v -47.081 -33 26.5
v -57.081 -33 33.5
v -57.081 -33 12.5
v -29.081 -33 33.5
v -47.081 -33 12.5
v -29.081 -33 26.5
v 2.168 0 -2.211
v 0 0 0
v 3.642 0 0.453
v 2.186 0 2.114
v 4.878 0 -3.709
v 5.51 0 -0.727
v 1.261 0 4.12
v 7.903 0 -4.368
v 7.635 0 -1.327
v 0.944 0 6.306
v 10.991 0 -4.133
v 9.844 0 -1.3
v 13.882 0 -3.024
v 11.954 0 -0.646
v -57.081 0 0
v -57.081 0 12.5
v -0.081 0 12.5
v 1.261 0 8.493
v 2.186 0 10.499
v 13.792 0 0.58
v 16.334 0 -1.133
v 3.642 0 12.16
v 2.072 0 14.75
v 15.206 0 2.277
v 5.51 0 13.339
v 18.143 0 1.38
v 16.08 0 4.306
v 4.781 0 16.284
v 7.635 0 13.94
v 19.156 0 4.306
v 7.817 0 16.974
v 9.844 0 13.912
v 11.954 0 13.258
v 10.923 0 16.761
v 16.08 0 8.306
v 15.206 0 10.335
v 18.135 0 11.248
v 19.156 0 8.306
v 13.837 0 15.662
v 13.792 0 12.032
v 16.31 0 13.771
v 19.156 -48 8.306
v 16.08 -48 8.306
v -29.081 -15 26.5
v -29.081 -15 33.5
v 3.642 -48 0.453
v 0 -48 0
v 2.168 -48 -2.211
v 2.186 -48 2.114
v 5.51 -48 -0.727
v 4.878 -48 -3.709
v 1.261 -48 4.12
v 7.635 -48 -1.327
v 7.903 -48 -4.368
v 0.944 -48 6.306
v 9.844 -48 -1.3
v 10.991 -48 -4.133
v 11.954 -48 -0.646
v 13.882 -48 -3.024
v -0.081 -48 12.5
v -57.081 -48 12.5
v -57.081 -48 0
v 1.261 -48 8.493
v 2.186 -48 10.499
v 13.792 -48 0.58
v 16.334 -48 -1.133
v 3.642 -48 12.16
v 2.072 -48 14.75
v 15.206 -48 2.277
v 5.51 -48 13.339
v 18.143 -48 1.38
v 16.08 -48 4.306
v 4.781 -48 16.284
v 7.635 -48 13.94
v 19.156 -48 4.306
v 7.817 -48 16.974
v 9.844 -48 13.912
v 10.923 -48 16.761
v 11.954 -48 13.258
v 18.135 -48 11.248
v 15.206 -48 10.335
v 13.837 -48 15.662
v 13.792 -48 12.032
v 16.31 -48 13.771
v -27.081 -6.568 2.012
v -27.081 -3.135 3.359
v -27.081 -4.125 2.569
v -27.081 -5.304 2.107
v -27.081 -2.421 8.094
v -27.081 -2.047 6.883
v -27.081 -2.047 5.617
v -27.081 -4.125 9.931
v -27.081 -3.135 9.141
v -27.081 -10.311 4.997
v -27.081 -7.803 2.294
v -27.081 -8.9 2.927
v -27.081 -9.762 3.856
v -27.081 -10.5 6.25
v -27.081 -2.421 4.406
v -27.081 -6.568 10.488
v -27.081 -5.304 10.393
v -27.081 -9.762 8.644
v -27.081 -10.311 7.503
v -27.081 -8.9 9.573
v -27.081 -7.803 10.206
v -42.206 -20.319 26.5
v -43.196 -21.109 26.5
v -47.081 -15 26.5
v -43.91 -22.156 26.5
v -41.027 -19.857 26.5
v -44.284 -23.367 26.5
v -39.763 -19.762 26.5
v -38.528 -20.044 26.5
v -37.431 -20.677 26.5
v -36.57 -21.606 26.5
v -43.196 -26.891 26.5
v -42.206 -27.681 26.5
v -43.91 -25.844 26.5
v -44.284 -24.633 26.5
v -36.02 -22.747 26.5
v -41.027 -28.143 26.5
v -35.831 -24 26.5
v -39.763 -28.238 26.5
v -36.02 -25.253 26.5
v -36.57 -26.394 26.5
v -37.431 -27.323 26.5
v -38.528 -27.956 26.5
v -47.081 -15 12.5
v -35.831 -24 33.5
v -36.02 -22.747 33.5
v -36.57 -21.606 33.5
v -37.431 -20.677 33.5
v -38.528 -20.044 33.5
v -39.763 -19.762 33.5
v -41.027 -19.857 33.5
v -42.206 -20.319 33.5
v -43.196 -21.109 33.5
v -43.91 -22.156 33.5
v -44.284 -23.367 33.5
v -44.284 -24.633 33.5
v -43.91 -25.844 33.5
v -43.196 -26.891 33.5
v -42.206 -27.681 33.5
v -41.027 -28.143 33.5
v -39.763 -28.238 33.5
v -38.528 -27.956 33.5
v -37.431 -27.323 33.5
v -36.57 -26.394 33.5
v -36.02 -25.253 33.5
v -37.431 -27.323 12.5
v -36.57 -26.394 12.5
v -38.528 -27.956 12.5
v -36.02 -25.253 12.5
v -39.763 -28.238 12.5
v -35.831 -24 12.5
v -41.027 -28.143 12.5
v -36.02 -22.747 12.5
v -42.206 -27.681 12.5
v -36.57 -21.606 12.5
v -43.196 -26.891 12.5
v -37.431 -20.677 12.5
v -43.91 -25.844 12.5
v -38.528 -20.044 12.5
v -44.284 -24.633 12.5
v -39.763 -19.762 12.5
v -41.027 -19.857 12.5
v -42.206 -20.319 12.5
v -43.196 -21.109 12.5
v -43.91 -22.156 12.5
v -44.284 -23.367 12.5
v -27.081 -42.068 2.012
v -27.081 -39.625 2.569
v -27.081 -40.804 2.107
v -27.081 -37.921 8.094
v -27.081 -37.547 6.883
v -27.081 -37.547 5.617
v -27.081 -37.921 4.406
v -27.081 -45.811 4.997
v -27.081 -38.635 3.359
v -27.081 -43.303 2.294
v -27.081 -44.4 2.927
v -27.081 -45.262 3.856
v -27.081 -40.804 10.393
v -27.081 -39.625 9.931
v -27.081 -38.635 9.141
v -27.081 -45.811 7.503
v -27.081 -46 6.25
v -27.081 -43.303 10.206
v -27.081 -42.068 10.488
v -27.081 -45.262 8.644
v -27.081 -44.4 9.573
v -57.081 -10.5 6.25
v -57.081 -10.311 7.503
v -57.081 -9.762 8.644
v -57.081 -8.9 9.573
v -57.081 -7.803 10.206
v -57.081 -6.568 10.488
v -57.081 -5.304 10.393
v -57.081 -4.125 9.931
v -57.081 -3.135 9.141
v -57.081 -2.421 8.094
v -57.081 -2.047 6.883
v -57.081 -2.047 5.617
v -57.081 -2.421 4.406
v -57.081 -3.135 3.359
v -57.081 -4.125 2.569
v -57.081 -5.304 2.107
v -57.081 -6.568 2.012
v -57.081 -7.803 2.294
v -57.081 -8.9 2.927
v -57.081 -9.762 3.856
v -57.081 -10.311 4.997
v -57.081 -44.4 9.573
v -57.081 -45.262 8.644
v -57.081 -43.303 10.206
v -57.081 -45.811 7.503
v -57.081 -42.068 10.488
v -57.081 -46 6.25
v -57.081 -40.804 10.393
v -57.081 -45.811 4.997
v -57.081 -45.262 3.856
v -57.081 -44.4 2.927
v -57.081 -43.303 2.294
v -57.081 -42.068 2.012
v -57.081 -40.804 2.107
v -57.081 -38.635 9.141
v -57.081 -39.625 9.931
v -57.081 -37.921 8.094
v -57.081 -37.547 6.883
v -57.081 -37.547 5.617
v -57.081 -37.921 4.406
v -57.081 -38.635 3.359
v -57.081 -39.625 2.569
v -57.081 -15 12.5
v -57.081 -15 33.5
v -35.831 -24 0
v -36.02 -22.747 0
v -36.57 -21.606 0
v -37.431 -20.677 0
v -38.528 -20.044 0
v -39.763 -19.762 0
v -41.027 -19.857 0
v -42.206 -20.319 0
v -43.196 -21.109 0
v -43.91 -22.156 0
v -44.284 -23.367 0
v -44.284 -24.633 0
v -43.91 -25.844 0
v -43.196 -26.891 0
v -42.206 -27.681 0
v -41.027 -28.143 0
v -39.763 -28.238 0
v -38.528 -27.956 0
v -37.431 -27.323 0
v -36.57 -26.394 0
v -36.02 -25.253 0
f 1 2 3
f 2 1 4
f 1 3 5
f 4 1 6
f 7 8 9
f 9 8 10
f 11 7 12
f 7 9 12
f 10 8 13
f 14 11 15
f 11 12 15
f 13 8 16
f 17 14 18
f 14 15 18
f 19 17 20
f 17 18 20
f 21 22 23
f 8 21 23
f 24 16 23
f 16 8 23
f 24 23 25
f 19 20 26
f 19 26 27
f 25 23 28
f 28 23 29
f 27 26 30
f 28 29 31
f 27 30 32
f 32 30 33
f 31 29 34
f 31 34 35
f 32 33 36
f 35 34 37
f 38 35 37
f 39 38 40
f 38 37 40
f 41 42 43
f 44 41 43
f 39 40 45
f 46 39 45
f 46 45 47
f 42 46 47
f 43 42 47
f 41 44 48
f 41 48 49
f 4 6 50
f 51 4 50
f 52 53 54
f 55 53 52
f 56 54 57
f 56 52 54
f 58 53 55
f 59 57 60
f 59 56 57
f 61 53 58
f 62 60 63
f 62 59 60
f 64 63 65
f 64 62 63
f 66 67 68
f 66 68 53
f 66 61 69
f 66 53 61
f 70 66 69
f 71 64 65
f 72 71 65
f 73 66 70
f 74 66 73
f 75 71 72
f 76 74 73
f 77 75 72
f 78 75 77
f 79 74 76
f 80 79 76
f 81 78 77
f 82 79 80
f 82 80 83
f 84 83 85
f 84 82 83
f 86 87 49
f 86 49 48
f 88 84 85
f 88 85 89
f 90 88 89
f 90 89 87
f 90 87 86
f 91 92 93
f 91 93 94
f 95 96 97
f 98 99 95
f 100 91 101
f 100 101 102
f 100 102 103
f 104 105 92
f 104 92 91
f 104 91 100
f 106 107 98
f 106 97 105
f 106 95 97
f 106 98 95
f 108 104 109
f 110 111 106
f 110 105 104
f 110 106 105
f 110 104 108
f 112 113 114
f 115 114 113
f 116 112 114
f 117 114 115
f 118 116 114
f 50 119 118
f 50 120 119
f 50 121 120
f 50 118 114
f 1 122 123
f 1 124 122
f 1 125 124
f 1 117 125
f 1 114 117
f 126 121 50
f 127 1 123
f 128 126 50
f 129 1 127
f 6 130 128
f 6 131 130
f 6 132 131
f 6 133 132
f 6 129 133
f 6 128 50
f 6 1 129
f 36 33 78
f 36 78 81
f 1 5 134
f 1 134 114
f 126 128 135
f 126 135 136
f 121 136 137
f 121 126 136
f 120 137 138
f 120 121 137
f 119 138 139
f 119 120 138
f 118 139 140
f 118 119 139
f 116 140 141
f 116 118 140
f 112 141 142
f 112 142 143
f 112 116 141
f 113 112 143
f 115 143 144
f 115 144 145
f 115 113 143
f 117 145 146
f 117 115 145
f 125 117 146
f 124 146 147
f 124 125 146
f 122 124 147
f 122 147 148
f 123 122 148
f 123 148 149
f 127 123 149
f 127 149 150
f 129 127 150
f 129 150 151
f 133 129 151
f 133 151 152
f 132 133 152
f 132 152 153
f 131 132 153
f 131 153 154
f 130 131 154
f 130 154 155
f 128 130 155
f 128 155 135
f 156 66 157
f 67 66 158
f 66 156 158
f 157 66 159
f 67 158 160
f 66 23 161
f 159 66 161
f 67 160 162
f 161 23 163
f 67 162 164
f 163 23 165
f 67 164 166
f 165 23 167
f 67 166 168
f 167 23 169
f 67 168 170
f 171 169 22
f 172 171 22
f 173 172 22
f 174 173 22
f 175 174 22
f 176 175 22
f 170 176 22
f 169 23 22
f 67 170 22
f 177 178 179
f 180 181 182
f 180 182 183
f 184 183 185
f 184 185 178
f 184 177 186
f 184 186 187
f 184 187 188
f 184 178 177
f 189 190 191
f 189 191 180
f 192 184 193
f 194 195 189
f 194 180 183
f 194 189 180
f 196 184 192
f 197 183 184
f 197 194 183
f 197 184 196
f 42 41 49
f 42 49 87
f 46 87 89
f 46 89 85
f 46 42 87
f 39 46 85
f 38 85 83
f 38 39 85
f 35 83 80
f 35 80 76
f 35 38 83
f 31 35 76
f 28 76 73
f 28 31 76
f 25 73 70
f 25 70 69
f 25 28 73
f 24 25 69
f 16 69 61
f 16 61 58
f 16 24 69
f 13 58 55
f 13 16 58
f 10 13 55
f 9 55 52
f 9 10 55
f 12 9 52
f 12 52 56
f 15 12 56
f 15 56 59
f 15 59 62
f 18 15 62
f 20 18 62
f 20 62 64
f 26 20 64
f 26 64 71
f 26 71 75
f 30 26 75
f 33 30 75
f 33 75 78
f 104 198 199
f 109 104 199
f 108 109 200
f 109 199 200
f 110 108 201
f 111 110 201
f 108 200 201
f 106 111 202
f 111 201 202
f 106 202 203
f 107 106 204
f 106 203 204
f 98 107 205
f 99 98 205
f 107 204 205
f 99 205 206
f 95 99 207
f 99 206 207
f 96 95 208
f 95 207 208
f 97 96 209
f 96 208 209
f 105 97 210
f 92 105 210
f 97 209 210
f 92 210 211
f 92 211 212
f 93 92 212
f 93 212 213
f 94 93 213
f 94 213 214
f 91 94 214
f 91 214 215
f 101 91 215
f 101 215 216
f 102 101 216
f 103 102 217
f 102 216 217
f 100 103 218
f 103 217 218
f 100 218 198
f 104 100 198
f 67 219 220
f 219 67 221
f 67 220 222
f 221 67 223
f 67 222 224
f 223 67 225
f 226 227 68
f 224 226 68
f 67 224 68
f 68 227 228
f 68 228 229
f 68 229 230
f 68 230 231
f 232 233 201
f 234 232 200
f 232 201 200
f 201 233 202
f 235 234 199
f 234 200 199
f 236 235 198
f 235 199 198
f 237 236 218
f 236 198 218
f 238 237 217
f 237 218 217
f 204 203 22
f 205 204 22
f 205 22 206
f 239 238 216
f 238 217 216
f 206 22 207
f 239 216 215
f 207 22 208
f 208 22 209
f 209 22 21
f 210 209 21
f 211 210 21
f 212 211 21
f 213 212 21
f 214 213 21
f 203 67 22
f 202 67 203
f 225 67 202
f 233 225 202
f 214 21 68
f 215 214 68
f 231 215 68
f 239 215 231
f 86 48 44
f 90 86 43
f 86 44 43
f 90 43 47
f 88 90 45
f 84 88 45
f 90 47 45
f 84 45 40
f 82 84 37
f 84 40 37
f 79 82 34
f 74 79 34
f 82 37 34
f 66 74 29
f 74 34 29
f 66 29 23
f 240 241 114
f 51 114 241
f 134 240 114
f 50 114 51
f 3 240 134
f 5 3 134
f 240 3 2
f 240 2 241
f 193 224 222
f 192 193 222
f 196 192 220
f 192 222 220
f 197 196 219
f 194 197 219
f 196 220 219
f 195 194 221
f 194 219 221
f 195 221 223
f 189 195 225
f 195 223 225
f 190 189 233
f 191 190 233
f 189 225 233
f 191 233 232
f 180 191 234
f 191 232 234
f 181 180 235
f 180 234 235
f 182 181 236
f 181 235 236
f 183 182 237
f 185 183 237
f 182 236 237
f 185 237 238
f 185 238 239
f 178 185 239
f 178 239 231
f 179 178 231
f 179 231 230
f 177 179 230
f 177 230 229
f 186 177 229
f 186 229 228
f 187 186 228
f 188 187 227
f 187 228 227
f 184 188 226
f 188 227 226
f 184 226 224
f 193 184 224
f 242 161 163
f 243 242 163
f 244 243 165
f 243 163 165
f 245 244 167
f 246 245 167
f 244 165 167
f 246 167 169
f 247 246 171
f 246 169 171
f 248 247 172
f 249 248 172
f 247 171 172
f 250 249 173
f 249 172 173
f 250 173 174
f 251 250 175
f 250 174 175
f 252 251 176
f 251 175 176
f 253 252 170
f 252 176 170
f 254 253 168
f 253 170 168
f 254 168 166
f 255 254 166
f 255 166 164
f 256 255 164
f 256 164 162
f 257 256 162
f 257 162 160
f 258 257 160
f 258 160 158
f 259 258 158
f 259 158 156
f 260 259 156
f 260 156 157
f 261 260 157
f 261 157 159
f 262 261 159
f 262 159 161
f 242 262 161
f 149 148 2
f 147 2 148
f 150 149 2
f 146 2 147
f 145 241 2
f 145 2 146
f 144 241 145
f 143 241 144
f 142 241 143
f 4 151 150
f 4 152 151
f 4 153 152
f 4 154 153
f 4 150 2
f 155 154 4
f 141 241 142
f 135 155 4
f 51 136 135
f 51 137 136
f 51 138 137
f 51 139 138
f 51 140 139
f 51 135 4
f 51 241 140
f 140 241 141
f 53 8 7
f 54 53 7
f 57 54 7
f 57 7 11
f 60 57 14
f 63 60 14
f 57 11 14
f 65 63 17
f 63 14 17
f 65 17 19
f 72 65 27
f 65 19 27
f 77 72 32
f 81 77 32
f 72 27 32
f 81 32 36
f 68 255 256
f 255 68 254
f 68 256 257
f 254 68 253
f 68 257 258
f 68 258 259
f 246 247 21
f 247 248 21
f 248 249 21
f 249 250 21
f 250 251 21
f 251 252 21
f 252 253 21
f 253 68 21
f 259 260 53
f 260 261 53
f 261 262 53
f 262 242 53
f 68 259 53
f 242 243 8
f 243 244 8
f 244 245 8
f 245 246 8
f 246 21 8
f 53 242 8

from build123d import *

# Parameters (mm, degrees)
F2_R      = 7.7
F3_DEPTH  = 48
F4_R      = 4.25
F5_DEPTH  = 30
F6_W      = 28
F6_H      = 18
F6_R      = 4.25
F7_DEPTH  = 21
F8_W      = 18
F8_H      = 14
F9_DEPTH  = 25
F10_R     = 4.25
F11_DEPTH = 25
F12_DEPTH = 60
F14_DEPTH = 48


with BuildPart() as f3:
    # F2 (on Front) → F3 (new body)
    with BuildSketch(Plane.XZ):
        with BuildLine():
            Line((-57.0810220509, 0), (0, 0))
            ThreePointArc((0, 0), (-2.0556624872, 6.2369382637), (-0.0810220509, 12.5))
            Line((-0.0810220509, 12.5), (-57.0810220509, 12.5))
            Line((-57.0810220509, 12.5), (-57.0810220509, 0))
        make_face()
        with BuildLine():
            Line((-0.0810220509, 12.5), (0, 0))
            ThreePointArc((0, 0), (11.9605862967, -3.8667611144), (19.344112749, 6.3062916824))
            ThreePointArc((19.344112749, 6.3062916824), (11.894578688, 16.5006269319), (-0.0810220509, 12.5))
        make_face()
        with Locations((8.644112749, 6.3062916824)):
            Circle(F2_R, mode=Mode.SUBTRACT)
        with BuildLine():
            ThreePointArc((-0.0810220509, 12.5), (-2.0556624872, 6.2369382637), (0, 0))
            Line((0, 0), (-0.0810220509, 12.5))
        make_face()
    extrude(amount=F3_DEPTH)

    # F4 (on face) → F5 (cut)
    with BuildSketch(Plane(origin=(-57.0810220509, 0, 0), x_dir=(0, -1, 0), z_dir=(-1, 0, 0))):
        with Locations((6.25, 6.25)):
            Circle(F4_R)
        with Locations((41.75, 6.25)):
            Circle(F4_R)
    extrude(amount=-F5_DEPTH, mode=Mode.SUBTRACT)


with BuildPart() as f7:
    # F6 (on face) → F7 (new body)
    with BuildSketch(Plane.XY.offset(12.5)):
        with Locations((-43.0810220509, -24)):
            Rectangle(F6_W, F6_H)
        with Locations((-40.0810220509, -24)):
            Circle(F6_R, mode=Mode.SUBTRACT)
    extrude(amount=F7_DEPTH)

    # F8 (on face) → F9 (cut)
    with BuildSketch(Plane.XZ.offset(33)):
        with Locations((-38.0810220509, 19.5)):
            Rectangle(F8_W, F8_H)
    extrude(amount=-F9_DEPTH, mode=Mode.SUBTRACT)


with BuildPart() as f11:
    # F10 (on face) → F11 (new body)
    with BuildSketch(Plane.XY.offset(33.5)):
        with Locations((-40.0810220509, -24)):
            Circle(F10_R)
    extrude(amount=F11_DEPTH)


with BuildPart() as f12_tool:
    # F12 (cut): a face of the model
    f12_faces = [f11.part.faces().sort_by_distance(p)[0] for p in [
        (-40.0810220509, -24, 58.5),
    ]]
    extrude(f12_faces, amount=-F12_DEPTH)


with BuildPart() as f3_1:
    add(f3.part)

    # F12: cut by f12_tool
    add(f12_tool.part, mode=Mode.SUBTRACT)

    # F13 (on face) → F14 (cut)
    with BuildSketch(Plane.XZ.offset(48)):
        with BuildLine():
            ThreePointArc((19.1555351075, 4.3062916824), (19.2968640189, 5.3018563277), (19.344112749, 6.3062916824))
            ThreePointArc((19.344112749, 6.3062916824), (19.2968640189, 7.3107270371), (19.1555351075, 8.3062916824))
            Line((19.1555351075, 8.3062916824), (16.079837327, 8.3062916824))
            ThreePointArc((16.079837327, 8.3062916824), (16.2777579873, 7.3149840907), (16.344112749, 6.3062916824))
            ThreePointArc((16.344112749, 6.3062916824), (16.2777579873, 5.297599274), (16.079837327, 4.3062916824))
            Line((16.079837327, 4.3062916824), (19.1555351075, 4.3062916824))
        make_face()
        with BuildLine():
            Line((16.079837327, 8.3062916824), (16.079837327, 4.3062916824))
            ThreePointArc((16.079837327, 4.3062916824), (16.2777579873, 5.297599274), (16.344112749, 6.3062916824))
            ThreePointArc((16.344112749, 6.3062916824), (16.2777579873, 7.3149840907), (16.079837327, 8.3062916824))
        make_face()
    extrude(amount=-F14_DEPTH, mode=Mode.SUBTRACT)


with BuildPart() as f11_1:
    add(f11.part)

    # F12: cut by f12_tool
    add(f12_tool.part, mode=Mode.SUBTRACT)


solid = Compound([f7.part, f3_1.part])
